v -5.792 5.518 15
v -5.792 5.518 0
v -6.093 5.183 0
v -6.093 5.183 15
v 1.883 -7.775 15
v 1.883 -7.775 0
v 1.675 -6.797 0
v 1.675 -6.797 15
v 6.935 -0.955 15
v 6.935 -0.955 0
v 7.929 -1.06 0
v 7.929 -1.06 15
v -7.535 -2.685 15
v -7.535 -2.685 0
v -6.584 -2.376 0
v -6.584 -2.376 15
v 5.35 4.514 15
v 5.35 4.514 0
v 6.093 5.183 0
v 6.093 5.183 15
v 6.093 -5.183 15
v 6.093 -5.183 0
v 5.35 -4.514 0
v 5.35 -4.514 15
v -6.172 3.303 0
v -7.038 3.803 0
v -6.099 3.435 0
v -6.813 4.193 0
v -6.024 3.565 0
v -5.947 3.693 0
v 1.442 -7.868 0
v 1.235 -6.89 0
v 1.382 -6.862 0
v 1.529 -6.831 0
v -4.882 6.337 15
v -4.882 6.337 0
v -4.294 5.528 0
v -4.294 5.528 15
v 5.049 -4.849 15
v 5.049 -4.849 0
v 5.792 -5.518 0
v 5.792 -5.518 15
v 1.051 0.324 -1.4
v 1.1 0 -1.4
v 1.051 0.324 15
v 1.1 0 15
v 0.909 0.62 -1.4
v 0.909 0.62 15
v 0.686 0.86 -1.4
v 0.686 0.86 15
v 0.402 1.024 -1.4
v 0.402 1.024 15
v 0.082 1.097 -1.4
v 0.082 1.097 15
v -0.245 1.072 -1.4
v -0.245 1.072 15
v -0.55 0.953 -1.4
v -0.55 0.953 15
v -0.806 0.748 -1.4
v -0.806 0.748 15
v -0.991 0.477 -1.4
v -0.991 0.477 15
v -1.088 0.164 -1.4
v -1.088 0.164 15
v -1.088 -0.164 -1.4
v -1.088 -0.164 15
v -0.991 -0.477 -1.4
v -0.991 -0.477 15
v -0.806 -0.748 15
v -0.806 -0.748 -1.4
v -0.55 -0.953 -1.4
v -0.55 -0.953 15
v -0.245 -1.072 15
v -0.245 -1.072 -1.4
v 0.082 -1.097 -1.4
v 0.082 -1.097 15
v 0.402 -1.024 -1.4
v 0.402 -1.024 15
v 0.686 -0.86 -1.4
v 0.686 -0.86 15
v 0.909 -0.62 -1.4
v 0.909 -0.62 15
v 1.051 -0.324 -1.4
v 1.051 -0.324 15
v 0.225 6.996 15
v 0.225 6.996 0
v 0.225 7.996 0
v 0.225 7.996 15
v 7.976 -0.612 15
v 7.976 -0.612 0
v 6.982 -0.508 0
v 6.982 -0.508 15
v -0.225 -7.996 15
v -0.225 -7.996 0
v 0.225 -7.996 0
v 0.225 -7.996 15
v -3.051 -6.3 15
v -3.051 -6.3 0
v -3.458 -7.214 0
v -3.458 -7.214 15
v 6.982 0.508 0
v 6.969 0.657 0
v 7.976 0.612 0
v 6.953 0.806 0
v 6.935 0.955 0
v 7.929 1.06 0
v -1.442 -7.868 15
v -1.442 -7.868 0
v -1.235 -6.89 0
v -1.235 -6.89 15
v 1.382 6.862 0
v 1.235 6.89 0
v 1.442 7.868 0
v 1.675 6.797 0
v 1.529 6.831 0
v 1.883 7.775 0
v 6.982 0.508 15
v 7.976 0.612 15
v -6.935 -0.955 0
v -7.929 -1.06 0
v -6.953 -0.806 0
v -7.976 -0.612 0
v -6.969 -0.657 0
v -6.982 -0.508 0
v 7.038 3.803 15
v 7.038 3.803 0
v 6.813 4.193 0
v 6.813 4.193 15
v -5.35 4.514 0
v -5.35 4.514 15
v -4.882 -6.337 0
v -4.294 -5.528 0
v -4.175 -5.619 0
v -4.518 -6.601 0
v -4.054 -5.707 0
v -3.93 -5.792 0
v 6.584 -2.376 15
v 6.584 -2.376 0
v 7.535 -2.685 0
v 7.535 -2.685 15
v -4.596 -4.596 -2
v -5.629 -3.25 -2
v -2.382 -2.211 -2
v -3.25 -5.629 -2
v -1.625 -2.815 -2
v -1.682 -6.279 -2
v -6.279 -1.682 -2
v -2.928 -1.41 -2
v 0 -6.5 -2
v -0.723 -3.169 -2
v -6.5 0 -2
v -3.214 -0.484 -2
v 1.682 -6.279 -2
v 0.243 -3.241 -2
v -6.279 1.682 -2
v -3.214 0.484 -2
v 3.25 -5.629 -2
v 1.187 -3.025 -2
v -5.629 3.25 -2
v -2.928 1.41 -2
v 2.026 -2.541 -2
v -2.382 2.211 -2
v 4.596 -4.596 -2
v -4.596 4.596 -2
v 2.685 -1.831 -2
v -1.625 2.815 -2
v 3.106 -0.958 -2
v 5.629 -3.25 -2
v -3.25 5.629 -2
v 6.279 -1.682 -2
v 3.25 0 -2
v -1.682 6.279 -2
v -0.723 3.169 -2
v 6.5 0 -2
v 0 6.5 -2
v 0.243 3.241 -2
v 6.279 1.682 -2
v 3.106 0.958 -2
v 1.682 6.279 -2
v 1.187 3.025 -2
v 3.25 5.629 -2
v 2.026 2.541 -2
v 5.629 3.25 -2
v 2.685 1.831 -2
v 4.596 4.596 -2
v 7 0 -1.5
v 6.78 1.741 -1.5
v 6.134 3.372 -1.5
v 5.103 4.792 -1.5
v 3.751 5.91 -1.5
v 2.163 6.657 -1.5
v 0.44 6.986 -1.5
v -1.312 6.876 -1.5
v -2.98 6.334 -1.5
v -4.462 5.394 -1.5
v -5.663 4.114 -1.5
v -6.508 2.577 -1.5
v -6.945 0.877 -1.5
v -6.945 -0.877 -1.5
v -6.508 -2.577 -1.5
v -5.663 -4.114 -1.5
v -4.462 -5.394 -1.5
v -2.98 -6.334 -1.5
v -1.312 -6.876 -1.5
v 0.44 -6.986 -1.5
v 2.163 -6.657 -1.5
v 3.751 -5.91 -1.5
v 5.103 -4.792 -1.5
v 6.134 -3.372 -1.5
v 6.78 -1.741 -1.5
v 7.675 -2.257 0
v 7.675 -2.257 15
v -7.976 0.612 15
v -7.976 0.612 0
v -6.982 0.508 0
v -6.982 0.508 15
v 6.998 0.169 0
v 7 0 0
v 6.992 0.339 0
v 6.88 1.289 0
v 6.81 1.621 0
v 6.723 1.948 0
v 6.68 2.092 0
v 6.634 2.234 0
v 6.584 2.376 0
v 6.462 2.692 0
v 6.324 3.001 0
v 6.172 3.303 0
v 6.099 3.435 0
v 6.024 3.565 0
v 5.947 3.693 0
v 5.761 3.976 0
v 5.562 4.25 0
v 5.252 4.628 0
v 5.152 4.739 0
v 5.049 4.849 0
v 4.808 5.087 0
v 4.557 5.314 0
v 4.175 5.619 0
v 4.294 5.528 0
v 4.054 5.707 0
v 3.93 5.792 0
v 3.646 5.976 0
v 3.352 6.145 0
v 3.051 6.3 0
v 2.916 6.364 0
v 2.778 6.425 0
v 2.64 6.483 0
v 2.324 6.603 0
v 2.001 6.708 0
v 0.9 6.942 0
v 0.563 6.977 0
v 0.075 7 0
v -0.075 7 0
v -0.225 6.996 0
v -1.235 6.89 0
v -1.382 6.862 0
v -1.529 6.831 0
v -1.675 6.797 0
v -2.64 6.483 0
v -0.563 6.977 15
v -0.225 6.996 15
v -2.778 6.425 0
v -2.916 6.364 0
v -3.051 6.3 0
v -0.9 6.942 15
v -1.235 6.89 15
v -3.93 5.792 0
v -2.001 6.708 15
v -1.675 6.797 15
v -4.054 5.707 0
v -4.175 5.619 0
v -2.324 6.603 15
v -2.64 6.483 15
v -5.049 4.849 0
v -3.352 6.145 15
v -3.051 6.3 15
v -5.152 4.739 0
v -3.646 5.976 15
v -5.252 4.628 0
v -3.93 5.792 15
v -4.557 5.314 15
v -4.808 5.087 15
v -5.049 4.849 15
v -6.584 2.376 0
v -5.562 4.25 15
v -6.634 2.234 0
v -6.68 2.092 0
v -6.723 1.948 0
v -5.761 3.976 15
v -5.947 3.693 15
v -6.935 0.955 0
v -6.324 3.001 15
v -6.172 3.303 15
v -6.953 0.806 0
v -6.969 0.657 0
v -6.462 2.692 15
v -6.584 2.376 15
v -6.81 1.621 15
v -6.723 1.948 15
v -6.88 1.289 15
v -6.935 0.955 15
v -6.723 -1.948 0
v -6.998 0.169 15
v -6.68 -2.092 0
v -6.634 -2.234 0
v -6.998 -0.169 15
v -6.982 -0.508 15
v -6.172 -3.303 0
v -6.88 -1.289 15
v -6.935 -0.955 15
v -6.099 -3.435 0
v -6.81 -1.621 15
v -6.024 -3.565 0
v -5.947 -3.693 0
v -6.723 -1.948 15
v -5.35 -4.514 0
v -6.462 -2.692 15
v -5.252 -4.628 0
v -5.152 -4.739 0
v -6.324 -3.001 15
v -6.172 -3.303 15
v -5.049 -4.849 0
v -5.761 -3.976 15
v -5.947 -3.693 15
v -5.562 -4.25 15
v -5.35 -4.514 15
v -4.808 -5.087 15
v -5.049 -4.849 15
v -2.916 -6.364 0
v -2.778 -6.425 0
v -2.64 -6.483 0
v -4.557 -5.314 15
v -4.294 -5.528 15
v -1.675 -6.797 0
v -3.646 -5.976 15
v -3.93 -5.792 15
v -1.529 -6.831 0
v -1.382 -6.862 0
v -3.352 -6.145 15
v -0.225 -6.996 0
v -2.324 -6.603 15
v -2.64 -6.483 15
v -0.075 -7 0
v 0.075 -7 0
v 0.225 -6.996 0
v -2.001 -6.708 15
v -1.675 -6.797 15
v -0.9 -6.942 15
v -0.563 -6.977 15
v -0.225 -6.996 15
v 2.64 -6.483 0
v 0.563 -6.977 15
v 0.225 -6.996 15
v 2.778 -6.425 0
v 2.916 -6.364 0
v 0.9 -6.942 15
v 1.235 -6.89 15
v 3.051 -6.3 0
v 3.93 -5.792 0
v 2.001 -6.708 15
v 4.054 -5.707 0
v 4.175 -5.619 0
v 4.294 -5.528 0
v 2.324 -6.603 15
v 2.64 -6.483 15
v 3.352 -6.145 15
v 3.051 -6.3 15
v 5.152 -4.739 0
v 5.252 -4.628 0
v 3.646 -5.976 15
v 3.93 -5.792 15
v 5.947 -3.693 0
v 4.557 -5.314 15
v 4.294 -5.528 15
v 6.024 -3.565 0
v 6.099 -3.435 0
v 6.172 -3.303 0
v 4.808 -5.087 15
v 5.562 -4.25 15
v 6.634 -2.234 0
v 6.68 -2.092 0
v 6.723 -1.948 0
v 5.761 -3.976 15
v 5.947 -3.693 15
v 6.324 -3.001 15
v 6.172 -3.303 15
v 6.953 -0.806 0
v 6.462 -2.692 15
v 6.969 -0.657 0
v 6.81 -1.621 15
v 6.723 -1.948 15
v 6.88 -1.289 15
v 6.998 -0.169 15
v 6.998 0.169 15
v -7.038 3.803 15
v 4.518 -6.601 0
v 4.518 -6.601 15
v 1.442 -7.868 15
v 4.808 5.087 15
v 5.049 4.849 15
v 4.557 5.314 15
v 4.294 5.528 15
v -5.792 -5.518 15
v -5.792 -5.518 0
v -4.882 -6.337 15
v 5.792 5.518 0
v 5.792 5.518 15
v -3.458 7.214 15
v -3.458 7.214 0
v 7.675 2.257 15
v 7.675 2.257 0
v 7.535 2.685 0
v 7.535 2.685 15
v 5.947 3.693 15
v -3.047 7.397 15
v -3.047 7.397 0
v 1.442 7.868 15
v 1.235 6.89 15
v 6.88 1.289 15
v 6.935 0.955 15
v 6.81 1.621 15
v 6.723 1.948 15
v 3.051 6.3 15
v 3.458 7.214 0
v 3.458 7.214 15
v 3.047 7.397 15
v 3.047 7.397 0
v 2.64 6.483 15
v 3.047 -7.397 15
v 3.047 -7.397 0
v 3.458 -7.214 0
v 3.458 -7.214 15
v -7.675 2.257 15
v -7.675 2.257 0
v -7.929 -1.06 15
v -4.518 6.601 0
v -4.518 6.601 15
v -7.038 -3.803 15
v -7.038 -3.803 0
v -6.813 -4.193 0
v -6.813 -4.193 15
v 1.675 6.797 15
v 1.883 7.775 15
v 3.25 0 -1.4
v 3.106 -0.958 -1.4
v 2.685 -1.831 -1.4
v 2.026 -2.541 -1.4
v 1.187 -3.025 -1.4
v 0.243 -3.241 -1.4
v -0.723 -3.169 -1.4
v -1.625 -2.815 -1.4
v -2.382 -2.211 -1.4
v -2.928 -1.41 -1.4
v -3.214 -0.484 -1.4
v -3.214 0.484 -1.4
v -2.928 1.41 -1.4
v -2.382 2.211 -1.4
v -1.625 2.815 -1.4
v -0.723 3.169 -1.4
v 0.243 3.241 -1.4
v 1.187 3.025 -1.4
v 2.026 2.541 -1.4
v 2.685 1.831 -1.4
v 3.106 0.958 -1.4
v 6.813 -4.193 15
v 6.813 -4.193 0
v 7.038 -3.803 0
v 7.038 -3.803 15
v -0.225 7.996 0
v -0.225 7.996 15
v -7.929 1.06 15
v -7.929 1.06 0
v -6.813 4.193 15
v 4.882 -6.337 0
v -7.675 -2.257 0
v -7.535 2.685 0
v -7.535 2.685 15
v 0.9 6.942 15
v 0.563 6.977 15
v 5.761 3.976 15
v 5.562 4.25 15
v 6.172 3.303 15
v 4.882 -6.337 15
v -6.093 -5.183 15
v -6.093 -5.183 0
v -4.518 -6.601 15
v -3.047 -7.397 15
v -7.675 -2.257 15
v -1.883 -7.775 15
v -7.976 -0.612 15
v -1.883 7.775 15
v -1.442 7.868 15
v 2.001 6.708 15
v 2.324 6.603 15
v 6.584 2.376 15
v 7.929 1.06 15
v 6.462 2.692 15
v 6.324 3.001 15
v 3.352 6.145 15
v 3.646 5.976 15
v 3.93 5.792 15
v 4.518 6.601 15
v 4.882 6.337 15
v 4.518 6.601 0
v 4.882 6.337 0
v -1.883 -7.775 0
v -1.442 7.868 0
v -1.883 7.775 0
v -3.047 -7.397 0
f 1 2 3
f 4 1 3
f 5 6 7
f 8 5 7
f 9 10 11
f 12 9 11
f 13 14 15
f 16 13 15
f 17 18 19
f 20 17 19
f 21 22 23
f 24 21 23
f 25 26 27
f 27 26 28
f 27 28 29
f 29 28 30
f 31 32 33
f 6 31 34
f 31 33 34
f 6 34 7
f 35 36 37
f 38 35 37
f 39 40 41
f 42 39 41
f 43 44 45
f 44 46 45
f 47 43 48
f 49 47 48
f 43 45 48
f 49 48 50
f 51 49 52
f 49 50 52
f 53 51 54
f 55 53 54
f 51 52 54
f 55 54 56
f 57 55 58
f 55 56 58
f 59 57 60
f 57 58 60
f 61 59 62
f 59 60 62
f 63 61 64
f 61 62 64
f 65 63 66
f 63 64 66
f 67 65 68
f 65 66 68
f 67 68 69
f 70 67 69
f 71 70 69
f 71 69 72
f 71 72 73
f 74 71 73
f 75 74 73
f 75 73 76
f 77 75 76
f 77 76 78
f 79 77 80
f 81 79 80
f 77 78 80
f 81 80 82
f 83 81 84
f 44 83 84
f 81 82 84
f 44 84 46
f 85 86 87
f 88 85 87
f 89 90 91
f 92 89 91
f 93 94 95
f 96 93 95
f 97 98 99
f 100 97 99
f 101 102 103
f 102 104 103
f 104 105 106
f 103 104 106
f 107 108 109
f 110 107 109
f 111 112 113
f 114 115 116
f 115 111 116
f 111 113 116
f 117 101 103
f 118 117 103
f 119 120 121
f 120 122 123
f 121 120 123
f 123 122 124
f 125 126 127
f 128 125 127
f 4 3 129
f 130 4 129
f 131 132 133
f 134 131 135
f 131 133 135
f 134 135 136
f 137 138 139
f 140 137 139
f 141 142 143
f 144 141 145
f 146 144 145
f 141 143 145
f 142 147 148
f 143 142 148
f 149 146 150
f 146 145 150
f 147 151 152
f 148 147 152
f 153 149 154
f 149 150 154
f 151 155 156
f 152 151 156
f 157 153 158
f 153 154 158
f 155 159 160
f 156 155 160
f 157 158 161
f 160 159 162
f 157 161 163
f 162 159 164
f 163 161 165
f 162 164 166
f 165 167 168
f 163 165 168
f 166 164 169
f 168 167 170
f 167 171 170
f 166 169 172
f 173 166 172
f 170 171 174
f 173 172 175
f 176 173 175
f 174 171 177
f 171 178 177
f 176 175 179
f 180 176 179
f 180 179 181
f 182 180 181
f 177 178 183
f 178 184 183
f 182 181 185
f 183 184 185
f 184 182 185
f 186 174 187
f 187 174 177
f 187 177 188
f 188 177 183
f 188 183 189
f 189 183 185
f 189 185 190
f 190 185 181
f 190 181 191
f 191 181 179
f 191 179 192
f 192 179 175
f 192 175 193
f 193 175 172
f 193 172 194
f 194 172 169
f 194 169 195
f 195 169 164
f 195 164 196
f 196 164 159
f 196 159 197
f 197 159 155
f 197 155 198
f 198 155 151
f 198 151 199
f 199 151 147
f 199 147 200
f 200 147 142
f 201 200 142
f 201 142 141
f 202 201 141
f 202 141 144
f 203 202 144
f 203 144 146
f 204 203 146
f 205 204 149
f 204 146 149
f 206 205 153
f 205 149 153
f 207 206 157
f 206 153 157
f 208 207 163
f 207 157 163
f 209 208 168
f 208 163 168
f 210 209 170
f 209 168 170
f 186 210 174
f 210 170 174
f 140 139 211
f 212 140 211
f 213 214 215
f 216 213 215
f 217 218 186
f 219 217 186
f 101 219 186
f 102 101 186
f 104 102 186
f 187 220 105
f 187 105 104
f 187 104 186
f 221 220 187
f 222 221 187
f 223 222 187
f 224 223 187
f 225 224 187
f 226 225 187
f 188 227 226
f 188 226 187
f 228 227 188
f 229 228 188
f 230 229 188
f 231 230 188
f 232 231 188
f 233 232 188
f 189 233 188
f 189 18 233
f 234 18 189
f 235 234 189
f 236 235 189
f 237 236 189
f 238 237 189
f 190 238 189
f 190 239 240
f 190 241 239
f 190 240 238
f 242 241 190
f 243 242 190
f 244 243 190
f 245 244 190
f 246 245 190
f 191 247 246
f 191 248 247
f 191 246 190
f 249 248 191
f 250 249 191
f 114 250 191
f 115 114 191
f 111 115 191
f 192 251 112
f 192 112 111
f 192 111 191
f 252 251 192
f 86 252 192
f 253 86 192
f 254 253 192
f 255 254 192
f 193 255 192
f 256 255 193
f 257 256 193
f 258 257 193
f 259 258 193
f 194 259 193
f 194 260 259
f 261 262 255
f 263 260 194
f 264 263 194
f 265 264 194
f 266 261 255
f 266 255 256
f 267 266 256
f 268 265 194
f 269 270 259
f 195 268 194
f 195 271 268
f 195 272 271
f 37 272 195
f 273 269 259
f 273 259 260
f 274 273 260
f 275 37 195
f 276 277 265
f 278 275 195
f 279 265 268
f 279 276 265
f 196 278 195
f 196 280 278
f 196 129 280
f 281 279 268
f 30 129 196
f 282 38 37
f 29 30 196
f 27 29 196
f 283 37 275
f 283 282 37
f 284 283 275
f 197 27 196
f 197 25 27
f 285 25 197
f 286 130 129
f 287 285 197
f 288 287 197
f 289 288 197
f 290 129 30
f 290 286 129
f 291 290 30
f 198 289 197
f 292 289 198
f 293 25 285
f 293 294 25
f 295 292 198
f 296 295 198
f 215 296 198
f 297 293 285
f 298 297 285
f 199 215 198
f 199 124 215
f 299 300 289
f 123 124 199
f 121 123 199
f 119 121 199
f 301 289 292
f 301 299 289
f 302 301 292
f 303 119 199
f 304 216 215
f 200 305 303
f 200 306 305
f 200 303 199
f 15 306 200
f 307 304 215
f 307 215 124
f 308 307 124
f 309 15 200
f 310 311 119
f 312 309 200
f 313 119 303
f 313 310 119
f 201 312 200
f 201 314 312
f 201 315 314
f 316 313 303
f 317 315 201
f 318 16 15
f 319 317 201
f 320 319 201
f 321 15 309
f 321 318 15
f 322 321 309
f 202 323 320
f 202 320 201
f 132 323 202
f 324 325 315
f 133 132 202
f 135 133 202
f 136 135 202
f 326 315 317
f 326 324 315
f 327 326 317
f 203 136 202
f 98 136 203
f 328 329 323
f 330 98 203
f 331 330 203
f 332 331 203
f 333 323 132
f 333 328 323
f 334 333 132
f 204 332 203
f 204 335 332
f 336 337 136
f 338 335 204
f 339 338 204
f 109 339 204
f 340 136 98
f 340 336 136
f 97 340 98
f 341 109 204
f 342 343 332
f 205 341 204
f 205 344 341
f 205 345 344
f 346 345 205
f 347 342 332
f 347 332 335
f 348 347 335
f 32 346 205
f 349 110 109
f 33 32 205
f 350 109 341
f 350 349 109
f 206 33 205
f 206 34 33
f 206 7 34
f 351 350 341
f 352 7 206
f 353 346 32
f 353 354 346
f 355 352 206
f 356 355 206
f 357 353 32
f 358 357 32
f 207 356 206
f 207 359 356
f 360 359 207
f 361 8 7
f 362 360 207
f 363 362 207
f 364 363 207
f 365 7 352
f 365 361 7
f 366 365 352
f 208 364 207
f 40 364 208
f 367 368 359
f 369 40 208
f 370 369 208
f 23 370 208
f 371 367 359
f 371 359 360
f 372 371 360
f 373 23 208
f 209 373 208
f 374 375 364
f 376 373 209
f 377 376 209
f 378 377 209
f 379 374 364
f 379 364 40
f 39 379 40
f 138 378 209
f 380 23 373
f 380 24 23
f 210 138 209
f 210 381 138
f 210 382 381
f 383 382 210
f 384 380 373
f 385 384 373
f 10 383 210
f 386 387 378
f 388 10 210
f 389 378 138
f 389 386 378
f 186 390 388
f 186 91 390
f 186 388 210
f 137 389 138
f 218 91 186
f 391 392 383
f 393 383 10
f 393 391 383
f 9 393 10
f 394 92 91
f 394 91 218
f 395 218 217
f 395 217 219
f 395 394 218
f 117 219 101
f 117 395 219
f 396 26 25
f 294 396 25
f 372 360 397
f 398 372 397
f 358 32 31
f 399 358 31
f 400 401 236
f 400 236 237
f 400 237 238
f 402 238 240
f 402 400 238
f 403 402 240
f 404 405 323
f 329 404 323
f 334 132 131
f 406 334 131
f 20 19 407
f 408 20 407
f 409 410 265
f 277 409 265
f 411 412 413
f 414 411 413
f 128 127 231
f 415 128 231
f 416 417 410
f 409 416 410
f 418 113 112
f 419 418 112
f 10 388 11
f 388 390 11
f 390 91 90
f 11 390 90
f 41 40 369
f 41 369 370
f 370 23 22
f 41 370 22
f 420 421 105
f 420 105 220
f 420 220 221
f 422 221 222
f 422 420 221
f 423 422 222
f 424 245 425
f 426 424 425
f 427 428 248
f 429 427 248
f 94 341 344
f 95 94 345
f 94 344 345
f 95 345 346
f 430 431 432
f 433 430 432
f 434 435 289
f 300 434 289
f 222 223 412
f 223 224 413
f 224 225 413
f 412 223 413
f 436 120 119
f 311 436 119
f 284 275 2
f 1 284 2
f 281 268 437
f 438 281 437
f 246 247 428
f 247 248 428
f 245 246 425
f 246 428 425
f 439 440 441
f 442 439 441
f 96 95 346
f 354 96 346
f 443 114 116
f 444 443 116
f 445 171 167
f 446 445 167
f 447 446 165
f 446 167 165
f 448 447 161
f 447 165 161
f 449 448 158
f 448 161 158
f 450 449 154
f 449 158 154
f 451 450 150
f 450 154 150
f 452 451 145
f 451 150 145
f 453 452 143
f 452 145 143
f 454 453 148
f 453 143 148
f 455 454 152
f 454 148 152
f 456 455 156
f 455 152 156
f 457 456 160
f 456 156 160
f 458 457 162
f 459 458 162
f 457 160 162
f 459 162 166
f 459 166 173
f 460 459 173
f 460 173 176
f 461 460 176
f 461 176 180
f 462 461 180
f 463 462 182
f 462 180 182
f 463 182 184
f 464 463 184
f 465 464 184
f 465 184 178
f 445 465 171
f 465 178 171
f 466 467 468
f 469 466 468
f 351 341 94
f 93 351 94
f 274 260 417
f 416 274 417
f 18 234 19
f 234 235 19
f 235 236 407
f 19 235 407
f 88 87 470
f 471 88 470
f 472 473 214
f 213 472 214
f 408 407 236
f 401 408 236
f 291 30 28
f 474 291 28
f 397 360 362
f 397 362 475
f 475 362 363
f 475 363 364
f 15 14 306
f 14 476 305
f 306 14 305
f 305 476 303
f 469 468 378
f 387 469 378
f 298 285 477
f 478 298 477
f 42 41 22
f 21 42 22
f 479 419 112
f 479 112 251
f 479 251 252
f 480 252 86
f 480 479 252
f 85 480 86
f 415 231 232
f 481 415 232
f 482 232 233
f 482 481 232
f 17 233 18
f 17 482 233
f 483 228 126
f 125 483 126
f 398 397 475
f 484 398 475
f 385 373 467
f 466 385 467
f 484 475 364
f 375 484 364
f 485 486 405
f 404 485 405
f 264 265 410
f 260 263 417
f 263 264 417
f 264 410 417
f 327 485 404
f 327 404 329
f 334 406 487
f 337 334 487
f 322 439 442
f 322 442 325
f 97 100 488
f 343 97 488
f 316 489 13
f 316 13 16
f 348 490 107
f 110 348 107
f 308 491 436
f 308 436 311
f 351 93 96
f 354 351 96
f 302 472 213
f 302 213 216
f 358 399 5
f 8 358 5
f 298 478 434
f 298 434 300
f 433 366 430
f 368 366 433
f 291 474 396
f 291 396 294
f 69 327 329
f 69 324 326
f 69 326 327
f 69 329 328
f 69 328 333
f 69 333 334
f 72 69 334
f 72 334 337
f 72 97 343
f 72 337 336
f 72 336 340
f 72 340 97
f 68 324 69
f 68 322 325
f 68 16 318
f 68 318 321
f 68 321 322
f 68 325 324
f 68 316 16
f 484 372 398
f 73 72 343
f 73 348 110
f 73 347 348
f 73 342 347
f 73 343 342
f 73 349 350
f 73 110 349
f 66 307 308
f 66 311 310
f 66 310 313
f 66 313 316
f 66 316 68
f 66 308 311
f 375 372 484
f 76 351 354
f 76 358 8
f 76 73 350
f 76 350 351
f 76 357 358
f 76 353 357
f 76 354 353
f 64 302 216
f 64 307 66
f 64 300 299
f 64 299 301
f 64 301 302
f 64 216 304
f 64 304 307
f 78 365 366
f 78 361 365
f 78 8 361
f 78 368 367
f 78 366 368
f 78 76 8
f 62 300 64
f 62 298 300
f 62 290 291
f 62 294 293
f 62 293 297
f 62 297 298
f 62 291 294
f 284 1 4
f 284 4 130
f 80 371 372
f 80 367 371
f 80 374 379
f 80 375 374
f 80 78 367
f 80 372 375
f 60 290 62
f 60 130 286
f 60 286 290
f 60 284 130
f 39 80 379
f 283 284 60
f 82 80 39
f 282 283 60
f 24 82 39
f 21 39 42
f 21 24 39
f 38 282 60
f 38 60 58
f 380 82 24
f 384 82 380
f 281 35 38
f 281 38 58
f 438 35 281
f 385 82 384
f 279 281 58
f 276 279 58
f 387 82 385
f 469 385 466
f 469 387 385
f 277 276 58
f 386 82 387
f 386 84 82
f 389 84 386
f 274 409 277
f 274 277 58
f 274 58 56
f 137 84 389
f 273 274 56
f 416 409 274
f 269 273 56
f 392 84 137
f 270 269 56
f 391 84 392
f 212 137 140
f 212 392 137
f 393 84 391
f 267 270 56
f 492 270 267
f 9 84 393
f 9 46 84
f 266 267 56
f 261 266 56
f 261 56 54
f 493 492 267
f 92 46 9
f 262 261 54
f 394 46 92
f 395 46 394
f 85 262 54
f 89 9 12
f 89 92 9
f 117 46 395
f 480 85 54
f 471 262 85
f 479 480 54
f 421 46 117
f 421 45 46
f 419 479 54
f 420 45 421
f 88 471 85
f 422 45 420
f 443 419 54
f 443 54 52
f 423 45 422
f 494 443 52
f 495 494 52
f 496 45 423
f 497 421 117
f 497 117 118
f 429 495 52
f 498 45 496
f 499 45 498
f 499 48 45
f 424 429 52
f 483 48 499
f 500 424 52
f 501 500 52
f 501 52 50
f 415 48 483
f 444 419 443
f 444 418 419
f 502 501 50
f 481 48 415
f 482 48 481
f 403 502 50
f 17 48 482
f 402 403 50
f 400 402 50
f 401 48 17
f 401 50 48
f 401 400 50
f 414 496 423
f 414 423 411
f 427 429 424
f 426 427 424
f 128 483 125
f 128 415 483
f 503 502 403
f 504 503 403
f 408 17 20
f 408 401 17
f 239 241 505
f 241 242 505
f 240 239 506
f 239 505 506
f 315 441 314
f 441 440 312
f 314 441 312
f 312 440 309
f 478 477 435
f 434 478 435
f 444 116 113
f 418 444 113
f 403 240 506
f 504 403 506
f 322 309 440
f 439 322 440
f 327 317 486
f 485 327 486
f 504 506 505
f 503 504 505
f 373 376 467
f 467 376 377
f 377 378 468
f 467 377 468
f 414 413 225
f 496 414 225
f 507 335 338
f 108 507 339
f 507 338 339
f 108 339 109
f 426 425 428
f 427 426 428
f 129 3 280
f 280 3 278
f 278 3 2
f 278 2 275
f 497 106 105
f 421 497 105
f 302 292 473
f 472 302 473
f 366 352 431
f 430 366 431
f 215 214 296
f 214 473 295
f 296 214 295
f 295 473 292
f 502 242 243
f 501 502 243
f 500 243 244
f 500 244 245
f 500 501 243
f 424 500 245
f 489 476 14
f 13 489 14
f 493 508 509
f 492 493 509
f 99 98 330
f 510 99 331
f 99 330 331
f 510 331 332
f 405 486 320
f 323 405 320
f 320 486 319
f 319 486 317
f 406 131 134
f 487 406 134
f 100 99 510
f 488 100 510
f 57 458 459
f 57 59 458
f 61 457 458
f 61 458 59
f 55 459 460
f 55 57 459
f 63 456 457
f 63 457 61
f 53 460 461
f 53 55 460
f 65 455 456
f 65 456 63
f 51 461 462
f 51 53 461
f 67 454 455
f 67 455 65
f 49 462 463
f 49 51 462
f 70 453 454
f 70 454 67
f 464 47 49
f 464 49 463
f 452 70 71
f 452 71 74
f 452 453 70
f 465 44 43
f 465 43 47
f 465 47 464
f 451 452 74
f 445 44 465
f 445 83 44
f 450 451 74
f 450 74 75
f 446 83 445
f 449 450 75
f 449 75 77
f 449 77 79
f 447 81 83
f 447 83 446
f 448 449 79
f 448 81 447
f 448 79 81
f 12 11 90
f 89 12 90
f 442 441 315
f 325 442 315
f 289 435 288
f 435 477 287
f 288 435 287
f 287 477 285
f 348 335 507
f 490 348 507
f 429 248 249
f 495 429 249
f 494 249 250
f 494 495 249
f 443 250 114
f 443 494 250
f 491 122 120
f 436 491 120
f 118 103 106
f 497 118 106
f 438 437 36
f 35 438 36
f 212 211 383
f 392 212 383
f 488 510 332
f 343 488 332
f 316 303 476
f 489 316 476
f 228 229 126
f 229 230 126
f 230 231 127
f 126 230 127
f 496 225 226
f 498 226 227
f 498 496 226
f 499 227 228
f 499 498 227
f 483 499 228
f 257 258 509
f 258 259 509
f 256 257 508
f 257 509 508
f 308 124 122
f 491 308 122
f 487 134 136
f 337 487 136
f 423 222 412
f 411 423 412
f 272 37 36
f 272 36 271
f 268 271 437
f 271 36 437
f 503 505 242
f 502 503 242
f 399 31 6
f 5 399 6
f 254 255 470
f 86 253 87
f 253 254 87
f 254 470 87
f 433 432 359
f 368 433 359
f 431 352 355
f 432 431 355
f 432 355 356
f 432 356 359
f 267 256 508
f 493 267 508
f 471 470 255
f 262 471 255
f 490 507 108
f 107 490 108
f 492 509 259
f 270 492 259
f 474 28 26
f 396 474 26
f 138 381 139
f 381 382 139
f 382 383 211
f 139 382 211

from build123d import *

# Parameters (mm, degrees)
F0_R      = 7
F1_DEPTH  = 15
F3_DEPTH  = 15
F4_COUNT  = 30
F6_R      = 7
F7_DEPTH  = 2
F8_SIZE   = 0.5
F9_R      = 3.25
F10_DEPTH = 0.6
F12_R     = 1.1
F13_DEPTH = 25


with BuildPart() as f1:
    # F0 (on Top) → F1 (new body)
    with BuildSketch(Plane.XY):
        Circle(F0_R)
    extrude(amount=F1_DEPTH)


with BuildPart() as f3:
    # F2 (on Top) → F3 (new body)
    with BuildSketch(Plane.XY):
        with BuildLine():
            ThreePointArc((-0.225, 6.996383), (0, 7), (0.225, 6.996383))
            Line((0.225, 6.996383), (0.225, 7.996383))
            Line((0.225, 7.996383), (-0.225, 7.996383))
            Line((-0.225, 7.996383), (-0.225, 6.996383))
        make_face()
    extrude(amount=F3_DEPTH)


with BuildPart() as f4_1:
    # F4: instance of F3
    add(f3.part.rotate(Axis((0, 0, 15), (0, 0, 1)), 1 * 360 / F4_COUNT))


with BuildPart() as f4_2:
    # F4: instance of F3
    add(f3.part.rotate(Axis((0, 0, 15), (0, 0, 1)), 2 * 360 / F4_COUNT))


with BuildPart() as f4_3:
    # F4: instance of F3
    add(f3.part.rotate(Axis((0, 0, 15), (0, 0, 1)), 3 * 360 / F4_COUNT))


with BuildPart() as f4_4:
    # F4: instance of F3
    add(f3.part.rotate(Axis((0, 0, 15), (0, 0, 1)), 4 * 360 / F4_COUNT))


with BuildPart() as f4_5:
    # F4: instance of F3
    add(f3.part.rotate(Axis((0, 0, 15), (0, 0, 1)), 5 * 360 / F4_COUNT))


with BuildPart() as f4_6:
    # F4: instance of F3
    add(f3.part.rotate(Axis((0, 0, 15), (0, 0, 1)), 6 * 360 / F4_COUNT))


with BuildPart() as f4_7:
    # F4: instance of F3
    add(f3.part.rotate(Axis((0, 0, 15), (0, 0, 1)), 7 * 360 / F4_COUNT))


with BuildPart() as f4_8:
    # F4: instance of F3
    add(f3.part.rotate(Axis((0, 0, 15), (0, 0, 1)), 8 * 360 / F4_COUNT))


with BuildPart() as f4_9:
    # F4: instance of F3
    add(f3.part.rotate(Axis((0, 0, 15), (0, 0, 1)), 9 * 360 / F4_COUNT))


with BuildPart() as f4_10:
    # F4: instance of F3
    add(f3.part.rotate(Axis((0, 0, 15), (0, 0, 1)), 10 * 360 / F4_COUNT))


with BuildPart() as f4_11:
    # F4: instance of F3
    add(f3.part.rotate(Axis((0, 0, 15), (0, 0, 1)), 11 * 360 / F4_COUNT))


with BuildPart() as f4_12:
    # F4: instance of F3
    add(f3.part.rotate(Axis((0, 0, 15), (0, 0, 1)), 12 * 360 / F4_COUNT))


with BuildPart() as f4_13:
    # F4: instance of F3
    add(f3.part.rotate(Axis((0, 0, 15), (0, 0, 1)), 13 * 360 / F4_COUNT))


with BuildPart() as f4_14:
    # F4: instance of F3
    add(f3.part.rotate(Axis((0, 0, 15), (0, 0, 1)), 14 * 360 / F4_COUNT))


with BuildPart() as f4_15:
    # F4: instance of F3
    add(f3.part.rotate(Axis((0, 0, 15), (0, 0, 1)), 15 * 360 / F4_COUNT))


with BuildPart() as f4_16:
    # F4: instance of F3
    add(f3.part.rotate(Axis((0, 0, 15), (0, 0, 1)), 16 * 360 / F4_COUNT))


with BuildPart() as f4_17:
    # F4: instance of F3
    add(f3.part.rotate(Axis((0, 0, 15), (0, 0, 1)), 17 * 360 / F4_COUNT))


with BuildPart() as f4_18:
    # F4: instance of F3
    add(f3.part.rotate(Axis((0, 0, 15), (0, 0, 1)), 18 * 360 / F4_COUNT))


with BuildPart() as f4_19:
    # F4: instance of F3
    add(f3.part.rotate(Axis((0, 0, 15), (0, 0, 1)), 19 * 360 / F4_COUNT))


with BuildPart() as f4_20:
    # F4: instance of F3
    add(f3.part.rotate(Axis((0, 0, 15), (0, 0, 1)), 20 * 360 / F4_COUNT))


with BuildPart() as f4_21:
    # F4: instance of F3
    add(f3.part.rotate(Axis((0, 0, 15), (0, 0, 1)), 21 * 360 / F4_COUNT))


with BuildPart() as f4_22:
    # F4: instance of F3
    add(f3.part.rotate(Axis((0, 0, 15), (0, 0, 1)), 22 * 360 / F4_COUNT))


with BuildPart() as f4_23:
    # F4: instance of F3
    add(f3.part.rotate(Axis((0, 0, 15), (0, 0, 1)), 23 * 360 / F4_COUNT))


with BuildPart() as f4_24:
    # F4: instance of F3
    add(f3.part.rotate(Axis((0, 0, 15), (0, 0, 1)), 24 * 360 / F4_COUNT))


with BuildPart() as f4_25:
    # F4: instance of F3
    add(f3.part.rotate(Axis((0, 0, 15), (0, 0, 1)), 25 * 360 / F4_COUNT))


with BuildPart() as f4_26:
    # F4: instance of F3
    add(f3.part.rotate(Axis((0, 0, 15), (0, 0, 1)), 26 * 360 / F4_COUNT))


with BuildPart() as f4_27:
    # F4: instance of F3
    add(f3.part.rotate(Axis((0, 0, 15), (0, 0, 1)), 27 * 360 / F4_COUNT))


with BuildPart() as f4_28:
    # F4: instance of F3
    add(f3.part.rotate(Axis((0, 0, 15), (0, 0, 1)), 28 * 360 / F4_COUNT))


with BuildPart() as f4_29:
    # F4: instance of F3
    add(f3.part.rotate(Axis((0, 0, 15), (0, 0, 1)), 29 * 360 / F4_COUNT))


with BuildPart() as f4_4_1:
    add(f4_4.part)

    # F5: union F4_2, F4_11, F4_1, F4_3, F4_6, F3, F4_13, F4_8, F4_7, F4_5, F4_9, F1, F4_10, F4_14, F4_12, F4_18, F4_17, F4_16, F4_15, F4_19, F4_20, F4_21, F4_22, F4_23, F4_24, F4_25, F4_26, F4_27, F4_28, F4_29
    add(f4_2.part)
    add(f4_11.part)
    add(f4_1.part)
    add(f4_3.part)
    add(f4_6.part)
    add(f3.part)
    add(f4_13.part)
    add(f4_8.part)
    add(f4_7.part)
    add(f4_5.part)
    add(f4_9.part)
    add(f1.part)
    add(f4_10.part)
    add(f4_14.part)
    add(f4_12.part)
    add(f4_18.part)
    add(f4_17.part)
    add(f4_16.part)
    add(f4_15.part)
    add(f4_19.part)
    add(f4_20.part)
    add(f4_21.part)
    add(f4_22.part)
    add(f4_23.part)
    add(f4_24.part)
    add(f4_25.part)
    add(f4_26.part)
    add(f4_27.part)
    add(f4_28.part)
    add(f4_29.part)

    # F6 (on Top) → F7 (join)
    with BuildSketch(Plane.XY):
        Circle(F6_R)
    extrude(amount=-F7_DEPTH)

    # F8
    f8_edges = [f4_4_1.edges().sort_by_distance(p)[0] for p in [
        (-7, 0, -2),
    ]]
    chamfer(f8_edges, length=F8_SIZE)

    # F9 (on face) → F10 (cut)
    with BuildSketch(Plane(origin=(0, 0, -2), x_dir=(1, 0, 0), z_dir=(0, 0, -1))):
        Circle(F9_R)
    extrude(amount=-F10_DEPTH, mode=Mode.SUBTRACT)

    # F12 (on face) → F13 (cut, symmetric)
    with BuildSketch(Plane.XY.offset(15)):
        Circle(F12_R)
    extrude(amount=F13_DEPTH, both=True, mode=Mode.SUBTRACT)


solid = f4_4_1.part
